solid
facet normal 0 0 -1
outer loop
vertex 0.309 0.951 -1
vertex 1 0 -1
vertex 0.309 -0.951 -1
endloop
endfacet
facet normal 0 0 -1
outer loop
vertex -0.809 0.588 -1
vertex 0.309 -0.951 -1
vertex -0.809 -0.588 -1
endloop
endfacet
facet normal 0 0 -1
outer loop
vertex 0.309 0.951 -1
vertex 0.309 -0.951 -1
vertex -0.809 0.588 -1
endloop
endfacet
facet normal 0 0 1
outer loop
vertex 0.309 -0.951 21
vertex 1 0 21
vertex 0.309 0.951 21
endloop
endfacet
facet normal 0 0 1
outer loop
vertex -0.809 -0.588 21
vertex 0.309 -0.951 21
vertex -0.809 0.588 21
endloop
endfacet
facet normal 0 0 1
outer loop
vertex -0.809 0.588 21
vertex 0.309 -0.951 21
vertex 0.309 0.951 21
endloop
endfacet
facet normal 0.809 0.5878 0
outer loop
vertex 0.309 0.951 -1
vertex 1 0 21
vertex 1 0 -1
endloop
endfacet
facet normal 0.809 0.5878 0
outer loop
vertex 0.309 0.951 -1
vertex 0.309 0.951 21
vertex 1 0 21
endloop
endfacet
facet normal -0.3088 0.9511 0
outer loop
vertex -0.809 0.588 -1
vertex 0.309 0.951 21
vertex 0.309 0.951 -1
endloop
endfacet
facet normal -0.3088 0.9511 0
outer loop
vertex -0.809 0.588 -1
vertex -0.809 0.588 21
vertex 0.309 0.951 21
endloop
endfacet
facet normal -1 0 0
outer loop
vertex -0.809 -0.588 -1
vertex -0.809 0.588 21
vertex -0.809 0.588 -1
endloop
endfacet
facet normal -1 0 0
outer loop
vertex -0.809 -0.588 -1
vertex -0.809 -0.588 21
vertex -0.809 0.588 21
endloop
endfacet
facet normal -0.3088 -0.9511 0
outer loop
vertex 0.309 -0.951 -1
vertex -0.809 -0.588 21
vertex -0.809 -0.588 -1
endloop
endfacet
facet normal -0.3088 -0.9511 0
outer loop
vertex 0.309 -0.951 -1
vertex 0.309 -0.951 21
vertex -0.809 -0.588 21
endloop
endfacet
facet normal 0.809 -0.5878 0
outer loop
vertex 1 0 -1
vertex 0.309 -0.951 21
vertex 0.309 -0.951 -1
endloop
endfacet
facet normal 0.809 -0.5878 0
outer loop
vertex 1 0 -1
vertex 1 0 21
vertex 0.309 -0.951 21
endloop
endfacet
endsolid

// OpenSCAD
// Unit of length: Unit.MM
translate(v = [0.0, 0.0, -1.0])
{
   linear_extrude(height = 22.0, center = false, twist = 0.0, scale = 1.0)
   {
      circle(d = 2.0);
   }
}
